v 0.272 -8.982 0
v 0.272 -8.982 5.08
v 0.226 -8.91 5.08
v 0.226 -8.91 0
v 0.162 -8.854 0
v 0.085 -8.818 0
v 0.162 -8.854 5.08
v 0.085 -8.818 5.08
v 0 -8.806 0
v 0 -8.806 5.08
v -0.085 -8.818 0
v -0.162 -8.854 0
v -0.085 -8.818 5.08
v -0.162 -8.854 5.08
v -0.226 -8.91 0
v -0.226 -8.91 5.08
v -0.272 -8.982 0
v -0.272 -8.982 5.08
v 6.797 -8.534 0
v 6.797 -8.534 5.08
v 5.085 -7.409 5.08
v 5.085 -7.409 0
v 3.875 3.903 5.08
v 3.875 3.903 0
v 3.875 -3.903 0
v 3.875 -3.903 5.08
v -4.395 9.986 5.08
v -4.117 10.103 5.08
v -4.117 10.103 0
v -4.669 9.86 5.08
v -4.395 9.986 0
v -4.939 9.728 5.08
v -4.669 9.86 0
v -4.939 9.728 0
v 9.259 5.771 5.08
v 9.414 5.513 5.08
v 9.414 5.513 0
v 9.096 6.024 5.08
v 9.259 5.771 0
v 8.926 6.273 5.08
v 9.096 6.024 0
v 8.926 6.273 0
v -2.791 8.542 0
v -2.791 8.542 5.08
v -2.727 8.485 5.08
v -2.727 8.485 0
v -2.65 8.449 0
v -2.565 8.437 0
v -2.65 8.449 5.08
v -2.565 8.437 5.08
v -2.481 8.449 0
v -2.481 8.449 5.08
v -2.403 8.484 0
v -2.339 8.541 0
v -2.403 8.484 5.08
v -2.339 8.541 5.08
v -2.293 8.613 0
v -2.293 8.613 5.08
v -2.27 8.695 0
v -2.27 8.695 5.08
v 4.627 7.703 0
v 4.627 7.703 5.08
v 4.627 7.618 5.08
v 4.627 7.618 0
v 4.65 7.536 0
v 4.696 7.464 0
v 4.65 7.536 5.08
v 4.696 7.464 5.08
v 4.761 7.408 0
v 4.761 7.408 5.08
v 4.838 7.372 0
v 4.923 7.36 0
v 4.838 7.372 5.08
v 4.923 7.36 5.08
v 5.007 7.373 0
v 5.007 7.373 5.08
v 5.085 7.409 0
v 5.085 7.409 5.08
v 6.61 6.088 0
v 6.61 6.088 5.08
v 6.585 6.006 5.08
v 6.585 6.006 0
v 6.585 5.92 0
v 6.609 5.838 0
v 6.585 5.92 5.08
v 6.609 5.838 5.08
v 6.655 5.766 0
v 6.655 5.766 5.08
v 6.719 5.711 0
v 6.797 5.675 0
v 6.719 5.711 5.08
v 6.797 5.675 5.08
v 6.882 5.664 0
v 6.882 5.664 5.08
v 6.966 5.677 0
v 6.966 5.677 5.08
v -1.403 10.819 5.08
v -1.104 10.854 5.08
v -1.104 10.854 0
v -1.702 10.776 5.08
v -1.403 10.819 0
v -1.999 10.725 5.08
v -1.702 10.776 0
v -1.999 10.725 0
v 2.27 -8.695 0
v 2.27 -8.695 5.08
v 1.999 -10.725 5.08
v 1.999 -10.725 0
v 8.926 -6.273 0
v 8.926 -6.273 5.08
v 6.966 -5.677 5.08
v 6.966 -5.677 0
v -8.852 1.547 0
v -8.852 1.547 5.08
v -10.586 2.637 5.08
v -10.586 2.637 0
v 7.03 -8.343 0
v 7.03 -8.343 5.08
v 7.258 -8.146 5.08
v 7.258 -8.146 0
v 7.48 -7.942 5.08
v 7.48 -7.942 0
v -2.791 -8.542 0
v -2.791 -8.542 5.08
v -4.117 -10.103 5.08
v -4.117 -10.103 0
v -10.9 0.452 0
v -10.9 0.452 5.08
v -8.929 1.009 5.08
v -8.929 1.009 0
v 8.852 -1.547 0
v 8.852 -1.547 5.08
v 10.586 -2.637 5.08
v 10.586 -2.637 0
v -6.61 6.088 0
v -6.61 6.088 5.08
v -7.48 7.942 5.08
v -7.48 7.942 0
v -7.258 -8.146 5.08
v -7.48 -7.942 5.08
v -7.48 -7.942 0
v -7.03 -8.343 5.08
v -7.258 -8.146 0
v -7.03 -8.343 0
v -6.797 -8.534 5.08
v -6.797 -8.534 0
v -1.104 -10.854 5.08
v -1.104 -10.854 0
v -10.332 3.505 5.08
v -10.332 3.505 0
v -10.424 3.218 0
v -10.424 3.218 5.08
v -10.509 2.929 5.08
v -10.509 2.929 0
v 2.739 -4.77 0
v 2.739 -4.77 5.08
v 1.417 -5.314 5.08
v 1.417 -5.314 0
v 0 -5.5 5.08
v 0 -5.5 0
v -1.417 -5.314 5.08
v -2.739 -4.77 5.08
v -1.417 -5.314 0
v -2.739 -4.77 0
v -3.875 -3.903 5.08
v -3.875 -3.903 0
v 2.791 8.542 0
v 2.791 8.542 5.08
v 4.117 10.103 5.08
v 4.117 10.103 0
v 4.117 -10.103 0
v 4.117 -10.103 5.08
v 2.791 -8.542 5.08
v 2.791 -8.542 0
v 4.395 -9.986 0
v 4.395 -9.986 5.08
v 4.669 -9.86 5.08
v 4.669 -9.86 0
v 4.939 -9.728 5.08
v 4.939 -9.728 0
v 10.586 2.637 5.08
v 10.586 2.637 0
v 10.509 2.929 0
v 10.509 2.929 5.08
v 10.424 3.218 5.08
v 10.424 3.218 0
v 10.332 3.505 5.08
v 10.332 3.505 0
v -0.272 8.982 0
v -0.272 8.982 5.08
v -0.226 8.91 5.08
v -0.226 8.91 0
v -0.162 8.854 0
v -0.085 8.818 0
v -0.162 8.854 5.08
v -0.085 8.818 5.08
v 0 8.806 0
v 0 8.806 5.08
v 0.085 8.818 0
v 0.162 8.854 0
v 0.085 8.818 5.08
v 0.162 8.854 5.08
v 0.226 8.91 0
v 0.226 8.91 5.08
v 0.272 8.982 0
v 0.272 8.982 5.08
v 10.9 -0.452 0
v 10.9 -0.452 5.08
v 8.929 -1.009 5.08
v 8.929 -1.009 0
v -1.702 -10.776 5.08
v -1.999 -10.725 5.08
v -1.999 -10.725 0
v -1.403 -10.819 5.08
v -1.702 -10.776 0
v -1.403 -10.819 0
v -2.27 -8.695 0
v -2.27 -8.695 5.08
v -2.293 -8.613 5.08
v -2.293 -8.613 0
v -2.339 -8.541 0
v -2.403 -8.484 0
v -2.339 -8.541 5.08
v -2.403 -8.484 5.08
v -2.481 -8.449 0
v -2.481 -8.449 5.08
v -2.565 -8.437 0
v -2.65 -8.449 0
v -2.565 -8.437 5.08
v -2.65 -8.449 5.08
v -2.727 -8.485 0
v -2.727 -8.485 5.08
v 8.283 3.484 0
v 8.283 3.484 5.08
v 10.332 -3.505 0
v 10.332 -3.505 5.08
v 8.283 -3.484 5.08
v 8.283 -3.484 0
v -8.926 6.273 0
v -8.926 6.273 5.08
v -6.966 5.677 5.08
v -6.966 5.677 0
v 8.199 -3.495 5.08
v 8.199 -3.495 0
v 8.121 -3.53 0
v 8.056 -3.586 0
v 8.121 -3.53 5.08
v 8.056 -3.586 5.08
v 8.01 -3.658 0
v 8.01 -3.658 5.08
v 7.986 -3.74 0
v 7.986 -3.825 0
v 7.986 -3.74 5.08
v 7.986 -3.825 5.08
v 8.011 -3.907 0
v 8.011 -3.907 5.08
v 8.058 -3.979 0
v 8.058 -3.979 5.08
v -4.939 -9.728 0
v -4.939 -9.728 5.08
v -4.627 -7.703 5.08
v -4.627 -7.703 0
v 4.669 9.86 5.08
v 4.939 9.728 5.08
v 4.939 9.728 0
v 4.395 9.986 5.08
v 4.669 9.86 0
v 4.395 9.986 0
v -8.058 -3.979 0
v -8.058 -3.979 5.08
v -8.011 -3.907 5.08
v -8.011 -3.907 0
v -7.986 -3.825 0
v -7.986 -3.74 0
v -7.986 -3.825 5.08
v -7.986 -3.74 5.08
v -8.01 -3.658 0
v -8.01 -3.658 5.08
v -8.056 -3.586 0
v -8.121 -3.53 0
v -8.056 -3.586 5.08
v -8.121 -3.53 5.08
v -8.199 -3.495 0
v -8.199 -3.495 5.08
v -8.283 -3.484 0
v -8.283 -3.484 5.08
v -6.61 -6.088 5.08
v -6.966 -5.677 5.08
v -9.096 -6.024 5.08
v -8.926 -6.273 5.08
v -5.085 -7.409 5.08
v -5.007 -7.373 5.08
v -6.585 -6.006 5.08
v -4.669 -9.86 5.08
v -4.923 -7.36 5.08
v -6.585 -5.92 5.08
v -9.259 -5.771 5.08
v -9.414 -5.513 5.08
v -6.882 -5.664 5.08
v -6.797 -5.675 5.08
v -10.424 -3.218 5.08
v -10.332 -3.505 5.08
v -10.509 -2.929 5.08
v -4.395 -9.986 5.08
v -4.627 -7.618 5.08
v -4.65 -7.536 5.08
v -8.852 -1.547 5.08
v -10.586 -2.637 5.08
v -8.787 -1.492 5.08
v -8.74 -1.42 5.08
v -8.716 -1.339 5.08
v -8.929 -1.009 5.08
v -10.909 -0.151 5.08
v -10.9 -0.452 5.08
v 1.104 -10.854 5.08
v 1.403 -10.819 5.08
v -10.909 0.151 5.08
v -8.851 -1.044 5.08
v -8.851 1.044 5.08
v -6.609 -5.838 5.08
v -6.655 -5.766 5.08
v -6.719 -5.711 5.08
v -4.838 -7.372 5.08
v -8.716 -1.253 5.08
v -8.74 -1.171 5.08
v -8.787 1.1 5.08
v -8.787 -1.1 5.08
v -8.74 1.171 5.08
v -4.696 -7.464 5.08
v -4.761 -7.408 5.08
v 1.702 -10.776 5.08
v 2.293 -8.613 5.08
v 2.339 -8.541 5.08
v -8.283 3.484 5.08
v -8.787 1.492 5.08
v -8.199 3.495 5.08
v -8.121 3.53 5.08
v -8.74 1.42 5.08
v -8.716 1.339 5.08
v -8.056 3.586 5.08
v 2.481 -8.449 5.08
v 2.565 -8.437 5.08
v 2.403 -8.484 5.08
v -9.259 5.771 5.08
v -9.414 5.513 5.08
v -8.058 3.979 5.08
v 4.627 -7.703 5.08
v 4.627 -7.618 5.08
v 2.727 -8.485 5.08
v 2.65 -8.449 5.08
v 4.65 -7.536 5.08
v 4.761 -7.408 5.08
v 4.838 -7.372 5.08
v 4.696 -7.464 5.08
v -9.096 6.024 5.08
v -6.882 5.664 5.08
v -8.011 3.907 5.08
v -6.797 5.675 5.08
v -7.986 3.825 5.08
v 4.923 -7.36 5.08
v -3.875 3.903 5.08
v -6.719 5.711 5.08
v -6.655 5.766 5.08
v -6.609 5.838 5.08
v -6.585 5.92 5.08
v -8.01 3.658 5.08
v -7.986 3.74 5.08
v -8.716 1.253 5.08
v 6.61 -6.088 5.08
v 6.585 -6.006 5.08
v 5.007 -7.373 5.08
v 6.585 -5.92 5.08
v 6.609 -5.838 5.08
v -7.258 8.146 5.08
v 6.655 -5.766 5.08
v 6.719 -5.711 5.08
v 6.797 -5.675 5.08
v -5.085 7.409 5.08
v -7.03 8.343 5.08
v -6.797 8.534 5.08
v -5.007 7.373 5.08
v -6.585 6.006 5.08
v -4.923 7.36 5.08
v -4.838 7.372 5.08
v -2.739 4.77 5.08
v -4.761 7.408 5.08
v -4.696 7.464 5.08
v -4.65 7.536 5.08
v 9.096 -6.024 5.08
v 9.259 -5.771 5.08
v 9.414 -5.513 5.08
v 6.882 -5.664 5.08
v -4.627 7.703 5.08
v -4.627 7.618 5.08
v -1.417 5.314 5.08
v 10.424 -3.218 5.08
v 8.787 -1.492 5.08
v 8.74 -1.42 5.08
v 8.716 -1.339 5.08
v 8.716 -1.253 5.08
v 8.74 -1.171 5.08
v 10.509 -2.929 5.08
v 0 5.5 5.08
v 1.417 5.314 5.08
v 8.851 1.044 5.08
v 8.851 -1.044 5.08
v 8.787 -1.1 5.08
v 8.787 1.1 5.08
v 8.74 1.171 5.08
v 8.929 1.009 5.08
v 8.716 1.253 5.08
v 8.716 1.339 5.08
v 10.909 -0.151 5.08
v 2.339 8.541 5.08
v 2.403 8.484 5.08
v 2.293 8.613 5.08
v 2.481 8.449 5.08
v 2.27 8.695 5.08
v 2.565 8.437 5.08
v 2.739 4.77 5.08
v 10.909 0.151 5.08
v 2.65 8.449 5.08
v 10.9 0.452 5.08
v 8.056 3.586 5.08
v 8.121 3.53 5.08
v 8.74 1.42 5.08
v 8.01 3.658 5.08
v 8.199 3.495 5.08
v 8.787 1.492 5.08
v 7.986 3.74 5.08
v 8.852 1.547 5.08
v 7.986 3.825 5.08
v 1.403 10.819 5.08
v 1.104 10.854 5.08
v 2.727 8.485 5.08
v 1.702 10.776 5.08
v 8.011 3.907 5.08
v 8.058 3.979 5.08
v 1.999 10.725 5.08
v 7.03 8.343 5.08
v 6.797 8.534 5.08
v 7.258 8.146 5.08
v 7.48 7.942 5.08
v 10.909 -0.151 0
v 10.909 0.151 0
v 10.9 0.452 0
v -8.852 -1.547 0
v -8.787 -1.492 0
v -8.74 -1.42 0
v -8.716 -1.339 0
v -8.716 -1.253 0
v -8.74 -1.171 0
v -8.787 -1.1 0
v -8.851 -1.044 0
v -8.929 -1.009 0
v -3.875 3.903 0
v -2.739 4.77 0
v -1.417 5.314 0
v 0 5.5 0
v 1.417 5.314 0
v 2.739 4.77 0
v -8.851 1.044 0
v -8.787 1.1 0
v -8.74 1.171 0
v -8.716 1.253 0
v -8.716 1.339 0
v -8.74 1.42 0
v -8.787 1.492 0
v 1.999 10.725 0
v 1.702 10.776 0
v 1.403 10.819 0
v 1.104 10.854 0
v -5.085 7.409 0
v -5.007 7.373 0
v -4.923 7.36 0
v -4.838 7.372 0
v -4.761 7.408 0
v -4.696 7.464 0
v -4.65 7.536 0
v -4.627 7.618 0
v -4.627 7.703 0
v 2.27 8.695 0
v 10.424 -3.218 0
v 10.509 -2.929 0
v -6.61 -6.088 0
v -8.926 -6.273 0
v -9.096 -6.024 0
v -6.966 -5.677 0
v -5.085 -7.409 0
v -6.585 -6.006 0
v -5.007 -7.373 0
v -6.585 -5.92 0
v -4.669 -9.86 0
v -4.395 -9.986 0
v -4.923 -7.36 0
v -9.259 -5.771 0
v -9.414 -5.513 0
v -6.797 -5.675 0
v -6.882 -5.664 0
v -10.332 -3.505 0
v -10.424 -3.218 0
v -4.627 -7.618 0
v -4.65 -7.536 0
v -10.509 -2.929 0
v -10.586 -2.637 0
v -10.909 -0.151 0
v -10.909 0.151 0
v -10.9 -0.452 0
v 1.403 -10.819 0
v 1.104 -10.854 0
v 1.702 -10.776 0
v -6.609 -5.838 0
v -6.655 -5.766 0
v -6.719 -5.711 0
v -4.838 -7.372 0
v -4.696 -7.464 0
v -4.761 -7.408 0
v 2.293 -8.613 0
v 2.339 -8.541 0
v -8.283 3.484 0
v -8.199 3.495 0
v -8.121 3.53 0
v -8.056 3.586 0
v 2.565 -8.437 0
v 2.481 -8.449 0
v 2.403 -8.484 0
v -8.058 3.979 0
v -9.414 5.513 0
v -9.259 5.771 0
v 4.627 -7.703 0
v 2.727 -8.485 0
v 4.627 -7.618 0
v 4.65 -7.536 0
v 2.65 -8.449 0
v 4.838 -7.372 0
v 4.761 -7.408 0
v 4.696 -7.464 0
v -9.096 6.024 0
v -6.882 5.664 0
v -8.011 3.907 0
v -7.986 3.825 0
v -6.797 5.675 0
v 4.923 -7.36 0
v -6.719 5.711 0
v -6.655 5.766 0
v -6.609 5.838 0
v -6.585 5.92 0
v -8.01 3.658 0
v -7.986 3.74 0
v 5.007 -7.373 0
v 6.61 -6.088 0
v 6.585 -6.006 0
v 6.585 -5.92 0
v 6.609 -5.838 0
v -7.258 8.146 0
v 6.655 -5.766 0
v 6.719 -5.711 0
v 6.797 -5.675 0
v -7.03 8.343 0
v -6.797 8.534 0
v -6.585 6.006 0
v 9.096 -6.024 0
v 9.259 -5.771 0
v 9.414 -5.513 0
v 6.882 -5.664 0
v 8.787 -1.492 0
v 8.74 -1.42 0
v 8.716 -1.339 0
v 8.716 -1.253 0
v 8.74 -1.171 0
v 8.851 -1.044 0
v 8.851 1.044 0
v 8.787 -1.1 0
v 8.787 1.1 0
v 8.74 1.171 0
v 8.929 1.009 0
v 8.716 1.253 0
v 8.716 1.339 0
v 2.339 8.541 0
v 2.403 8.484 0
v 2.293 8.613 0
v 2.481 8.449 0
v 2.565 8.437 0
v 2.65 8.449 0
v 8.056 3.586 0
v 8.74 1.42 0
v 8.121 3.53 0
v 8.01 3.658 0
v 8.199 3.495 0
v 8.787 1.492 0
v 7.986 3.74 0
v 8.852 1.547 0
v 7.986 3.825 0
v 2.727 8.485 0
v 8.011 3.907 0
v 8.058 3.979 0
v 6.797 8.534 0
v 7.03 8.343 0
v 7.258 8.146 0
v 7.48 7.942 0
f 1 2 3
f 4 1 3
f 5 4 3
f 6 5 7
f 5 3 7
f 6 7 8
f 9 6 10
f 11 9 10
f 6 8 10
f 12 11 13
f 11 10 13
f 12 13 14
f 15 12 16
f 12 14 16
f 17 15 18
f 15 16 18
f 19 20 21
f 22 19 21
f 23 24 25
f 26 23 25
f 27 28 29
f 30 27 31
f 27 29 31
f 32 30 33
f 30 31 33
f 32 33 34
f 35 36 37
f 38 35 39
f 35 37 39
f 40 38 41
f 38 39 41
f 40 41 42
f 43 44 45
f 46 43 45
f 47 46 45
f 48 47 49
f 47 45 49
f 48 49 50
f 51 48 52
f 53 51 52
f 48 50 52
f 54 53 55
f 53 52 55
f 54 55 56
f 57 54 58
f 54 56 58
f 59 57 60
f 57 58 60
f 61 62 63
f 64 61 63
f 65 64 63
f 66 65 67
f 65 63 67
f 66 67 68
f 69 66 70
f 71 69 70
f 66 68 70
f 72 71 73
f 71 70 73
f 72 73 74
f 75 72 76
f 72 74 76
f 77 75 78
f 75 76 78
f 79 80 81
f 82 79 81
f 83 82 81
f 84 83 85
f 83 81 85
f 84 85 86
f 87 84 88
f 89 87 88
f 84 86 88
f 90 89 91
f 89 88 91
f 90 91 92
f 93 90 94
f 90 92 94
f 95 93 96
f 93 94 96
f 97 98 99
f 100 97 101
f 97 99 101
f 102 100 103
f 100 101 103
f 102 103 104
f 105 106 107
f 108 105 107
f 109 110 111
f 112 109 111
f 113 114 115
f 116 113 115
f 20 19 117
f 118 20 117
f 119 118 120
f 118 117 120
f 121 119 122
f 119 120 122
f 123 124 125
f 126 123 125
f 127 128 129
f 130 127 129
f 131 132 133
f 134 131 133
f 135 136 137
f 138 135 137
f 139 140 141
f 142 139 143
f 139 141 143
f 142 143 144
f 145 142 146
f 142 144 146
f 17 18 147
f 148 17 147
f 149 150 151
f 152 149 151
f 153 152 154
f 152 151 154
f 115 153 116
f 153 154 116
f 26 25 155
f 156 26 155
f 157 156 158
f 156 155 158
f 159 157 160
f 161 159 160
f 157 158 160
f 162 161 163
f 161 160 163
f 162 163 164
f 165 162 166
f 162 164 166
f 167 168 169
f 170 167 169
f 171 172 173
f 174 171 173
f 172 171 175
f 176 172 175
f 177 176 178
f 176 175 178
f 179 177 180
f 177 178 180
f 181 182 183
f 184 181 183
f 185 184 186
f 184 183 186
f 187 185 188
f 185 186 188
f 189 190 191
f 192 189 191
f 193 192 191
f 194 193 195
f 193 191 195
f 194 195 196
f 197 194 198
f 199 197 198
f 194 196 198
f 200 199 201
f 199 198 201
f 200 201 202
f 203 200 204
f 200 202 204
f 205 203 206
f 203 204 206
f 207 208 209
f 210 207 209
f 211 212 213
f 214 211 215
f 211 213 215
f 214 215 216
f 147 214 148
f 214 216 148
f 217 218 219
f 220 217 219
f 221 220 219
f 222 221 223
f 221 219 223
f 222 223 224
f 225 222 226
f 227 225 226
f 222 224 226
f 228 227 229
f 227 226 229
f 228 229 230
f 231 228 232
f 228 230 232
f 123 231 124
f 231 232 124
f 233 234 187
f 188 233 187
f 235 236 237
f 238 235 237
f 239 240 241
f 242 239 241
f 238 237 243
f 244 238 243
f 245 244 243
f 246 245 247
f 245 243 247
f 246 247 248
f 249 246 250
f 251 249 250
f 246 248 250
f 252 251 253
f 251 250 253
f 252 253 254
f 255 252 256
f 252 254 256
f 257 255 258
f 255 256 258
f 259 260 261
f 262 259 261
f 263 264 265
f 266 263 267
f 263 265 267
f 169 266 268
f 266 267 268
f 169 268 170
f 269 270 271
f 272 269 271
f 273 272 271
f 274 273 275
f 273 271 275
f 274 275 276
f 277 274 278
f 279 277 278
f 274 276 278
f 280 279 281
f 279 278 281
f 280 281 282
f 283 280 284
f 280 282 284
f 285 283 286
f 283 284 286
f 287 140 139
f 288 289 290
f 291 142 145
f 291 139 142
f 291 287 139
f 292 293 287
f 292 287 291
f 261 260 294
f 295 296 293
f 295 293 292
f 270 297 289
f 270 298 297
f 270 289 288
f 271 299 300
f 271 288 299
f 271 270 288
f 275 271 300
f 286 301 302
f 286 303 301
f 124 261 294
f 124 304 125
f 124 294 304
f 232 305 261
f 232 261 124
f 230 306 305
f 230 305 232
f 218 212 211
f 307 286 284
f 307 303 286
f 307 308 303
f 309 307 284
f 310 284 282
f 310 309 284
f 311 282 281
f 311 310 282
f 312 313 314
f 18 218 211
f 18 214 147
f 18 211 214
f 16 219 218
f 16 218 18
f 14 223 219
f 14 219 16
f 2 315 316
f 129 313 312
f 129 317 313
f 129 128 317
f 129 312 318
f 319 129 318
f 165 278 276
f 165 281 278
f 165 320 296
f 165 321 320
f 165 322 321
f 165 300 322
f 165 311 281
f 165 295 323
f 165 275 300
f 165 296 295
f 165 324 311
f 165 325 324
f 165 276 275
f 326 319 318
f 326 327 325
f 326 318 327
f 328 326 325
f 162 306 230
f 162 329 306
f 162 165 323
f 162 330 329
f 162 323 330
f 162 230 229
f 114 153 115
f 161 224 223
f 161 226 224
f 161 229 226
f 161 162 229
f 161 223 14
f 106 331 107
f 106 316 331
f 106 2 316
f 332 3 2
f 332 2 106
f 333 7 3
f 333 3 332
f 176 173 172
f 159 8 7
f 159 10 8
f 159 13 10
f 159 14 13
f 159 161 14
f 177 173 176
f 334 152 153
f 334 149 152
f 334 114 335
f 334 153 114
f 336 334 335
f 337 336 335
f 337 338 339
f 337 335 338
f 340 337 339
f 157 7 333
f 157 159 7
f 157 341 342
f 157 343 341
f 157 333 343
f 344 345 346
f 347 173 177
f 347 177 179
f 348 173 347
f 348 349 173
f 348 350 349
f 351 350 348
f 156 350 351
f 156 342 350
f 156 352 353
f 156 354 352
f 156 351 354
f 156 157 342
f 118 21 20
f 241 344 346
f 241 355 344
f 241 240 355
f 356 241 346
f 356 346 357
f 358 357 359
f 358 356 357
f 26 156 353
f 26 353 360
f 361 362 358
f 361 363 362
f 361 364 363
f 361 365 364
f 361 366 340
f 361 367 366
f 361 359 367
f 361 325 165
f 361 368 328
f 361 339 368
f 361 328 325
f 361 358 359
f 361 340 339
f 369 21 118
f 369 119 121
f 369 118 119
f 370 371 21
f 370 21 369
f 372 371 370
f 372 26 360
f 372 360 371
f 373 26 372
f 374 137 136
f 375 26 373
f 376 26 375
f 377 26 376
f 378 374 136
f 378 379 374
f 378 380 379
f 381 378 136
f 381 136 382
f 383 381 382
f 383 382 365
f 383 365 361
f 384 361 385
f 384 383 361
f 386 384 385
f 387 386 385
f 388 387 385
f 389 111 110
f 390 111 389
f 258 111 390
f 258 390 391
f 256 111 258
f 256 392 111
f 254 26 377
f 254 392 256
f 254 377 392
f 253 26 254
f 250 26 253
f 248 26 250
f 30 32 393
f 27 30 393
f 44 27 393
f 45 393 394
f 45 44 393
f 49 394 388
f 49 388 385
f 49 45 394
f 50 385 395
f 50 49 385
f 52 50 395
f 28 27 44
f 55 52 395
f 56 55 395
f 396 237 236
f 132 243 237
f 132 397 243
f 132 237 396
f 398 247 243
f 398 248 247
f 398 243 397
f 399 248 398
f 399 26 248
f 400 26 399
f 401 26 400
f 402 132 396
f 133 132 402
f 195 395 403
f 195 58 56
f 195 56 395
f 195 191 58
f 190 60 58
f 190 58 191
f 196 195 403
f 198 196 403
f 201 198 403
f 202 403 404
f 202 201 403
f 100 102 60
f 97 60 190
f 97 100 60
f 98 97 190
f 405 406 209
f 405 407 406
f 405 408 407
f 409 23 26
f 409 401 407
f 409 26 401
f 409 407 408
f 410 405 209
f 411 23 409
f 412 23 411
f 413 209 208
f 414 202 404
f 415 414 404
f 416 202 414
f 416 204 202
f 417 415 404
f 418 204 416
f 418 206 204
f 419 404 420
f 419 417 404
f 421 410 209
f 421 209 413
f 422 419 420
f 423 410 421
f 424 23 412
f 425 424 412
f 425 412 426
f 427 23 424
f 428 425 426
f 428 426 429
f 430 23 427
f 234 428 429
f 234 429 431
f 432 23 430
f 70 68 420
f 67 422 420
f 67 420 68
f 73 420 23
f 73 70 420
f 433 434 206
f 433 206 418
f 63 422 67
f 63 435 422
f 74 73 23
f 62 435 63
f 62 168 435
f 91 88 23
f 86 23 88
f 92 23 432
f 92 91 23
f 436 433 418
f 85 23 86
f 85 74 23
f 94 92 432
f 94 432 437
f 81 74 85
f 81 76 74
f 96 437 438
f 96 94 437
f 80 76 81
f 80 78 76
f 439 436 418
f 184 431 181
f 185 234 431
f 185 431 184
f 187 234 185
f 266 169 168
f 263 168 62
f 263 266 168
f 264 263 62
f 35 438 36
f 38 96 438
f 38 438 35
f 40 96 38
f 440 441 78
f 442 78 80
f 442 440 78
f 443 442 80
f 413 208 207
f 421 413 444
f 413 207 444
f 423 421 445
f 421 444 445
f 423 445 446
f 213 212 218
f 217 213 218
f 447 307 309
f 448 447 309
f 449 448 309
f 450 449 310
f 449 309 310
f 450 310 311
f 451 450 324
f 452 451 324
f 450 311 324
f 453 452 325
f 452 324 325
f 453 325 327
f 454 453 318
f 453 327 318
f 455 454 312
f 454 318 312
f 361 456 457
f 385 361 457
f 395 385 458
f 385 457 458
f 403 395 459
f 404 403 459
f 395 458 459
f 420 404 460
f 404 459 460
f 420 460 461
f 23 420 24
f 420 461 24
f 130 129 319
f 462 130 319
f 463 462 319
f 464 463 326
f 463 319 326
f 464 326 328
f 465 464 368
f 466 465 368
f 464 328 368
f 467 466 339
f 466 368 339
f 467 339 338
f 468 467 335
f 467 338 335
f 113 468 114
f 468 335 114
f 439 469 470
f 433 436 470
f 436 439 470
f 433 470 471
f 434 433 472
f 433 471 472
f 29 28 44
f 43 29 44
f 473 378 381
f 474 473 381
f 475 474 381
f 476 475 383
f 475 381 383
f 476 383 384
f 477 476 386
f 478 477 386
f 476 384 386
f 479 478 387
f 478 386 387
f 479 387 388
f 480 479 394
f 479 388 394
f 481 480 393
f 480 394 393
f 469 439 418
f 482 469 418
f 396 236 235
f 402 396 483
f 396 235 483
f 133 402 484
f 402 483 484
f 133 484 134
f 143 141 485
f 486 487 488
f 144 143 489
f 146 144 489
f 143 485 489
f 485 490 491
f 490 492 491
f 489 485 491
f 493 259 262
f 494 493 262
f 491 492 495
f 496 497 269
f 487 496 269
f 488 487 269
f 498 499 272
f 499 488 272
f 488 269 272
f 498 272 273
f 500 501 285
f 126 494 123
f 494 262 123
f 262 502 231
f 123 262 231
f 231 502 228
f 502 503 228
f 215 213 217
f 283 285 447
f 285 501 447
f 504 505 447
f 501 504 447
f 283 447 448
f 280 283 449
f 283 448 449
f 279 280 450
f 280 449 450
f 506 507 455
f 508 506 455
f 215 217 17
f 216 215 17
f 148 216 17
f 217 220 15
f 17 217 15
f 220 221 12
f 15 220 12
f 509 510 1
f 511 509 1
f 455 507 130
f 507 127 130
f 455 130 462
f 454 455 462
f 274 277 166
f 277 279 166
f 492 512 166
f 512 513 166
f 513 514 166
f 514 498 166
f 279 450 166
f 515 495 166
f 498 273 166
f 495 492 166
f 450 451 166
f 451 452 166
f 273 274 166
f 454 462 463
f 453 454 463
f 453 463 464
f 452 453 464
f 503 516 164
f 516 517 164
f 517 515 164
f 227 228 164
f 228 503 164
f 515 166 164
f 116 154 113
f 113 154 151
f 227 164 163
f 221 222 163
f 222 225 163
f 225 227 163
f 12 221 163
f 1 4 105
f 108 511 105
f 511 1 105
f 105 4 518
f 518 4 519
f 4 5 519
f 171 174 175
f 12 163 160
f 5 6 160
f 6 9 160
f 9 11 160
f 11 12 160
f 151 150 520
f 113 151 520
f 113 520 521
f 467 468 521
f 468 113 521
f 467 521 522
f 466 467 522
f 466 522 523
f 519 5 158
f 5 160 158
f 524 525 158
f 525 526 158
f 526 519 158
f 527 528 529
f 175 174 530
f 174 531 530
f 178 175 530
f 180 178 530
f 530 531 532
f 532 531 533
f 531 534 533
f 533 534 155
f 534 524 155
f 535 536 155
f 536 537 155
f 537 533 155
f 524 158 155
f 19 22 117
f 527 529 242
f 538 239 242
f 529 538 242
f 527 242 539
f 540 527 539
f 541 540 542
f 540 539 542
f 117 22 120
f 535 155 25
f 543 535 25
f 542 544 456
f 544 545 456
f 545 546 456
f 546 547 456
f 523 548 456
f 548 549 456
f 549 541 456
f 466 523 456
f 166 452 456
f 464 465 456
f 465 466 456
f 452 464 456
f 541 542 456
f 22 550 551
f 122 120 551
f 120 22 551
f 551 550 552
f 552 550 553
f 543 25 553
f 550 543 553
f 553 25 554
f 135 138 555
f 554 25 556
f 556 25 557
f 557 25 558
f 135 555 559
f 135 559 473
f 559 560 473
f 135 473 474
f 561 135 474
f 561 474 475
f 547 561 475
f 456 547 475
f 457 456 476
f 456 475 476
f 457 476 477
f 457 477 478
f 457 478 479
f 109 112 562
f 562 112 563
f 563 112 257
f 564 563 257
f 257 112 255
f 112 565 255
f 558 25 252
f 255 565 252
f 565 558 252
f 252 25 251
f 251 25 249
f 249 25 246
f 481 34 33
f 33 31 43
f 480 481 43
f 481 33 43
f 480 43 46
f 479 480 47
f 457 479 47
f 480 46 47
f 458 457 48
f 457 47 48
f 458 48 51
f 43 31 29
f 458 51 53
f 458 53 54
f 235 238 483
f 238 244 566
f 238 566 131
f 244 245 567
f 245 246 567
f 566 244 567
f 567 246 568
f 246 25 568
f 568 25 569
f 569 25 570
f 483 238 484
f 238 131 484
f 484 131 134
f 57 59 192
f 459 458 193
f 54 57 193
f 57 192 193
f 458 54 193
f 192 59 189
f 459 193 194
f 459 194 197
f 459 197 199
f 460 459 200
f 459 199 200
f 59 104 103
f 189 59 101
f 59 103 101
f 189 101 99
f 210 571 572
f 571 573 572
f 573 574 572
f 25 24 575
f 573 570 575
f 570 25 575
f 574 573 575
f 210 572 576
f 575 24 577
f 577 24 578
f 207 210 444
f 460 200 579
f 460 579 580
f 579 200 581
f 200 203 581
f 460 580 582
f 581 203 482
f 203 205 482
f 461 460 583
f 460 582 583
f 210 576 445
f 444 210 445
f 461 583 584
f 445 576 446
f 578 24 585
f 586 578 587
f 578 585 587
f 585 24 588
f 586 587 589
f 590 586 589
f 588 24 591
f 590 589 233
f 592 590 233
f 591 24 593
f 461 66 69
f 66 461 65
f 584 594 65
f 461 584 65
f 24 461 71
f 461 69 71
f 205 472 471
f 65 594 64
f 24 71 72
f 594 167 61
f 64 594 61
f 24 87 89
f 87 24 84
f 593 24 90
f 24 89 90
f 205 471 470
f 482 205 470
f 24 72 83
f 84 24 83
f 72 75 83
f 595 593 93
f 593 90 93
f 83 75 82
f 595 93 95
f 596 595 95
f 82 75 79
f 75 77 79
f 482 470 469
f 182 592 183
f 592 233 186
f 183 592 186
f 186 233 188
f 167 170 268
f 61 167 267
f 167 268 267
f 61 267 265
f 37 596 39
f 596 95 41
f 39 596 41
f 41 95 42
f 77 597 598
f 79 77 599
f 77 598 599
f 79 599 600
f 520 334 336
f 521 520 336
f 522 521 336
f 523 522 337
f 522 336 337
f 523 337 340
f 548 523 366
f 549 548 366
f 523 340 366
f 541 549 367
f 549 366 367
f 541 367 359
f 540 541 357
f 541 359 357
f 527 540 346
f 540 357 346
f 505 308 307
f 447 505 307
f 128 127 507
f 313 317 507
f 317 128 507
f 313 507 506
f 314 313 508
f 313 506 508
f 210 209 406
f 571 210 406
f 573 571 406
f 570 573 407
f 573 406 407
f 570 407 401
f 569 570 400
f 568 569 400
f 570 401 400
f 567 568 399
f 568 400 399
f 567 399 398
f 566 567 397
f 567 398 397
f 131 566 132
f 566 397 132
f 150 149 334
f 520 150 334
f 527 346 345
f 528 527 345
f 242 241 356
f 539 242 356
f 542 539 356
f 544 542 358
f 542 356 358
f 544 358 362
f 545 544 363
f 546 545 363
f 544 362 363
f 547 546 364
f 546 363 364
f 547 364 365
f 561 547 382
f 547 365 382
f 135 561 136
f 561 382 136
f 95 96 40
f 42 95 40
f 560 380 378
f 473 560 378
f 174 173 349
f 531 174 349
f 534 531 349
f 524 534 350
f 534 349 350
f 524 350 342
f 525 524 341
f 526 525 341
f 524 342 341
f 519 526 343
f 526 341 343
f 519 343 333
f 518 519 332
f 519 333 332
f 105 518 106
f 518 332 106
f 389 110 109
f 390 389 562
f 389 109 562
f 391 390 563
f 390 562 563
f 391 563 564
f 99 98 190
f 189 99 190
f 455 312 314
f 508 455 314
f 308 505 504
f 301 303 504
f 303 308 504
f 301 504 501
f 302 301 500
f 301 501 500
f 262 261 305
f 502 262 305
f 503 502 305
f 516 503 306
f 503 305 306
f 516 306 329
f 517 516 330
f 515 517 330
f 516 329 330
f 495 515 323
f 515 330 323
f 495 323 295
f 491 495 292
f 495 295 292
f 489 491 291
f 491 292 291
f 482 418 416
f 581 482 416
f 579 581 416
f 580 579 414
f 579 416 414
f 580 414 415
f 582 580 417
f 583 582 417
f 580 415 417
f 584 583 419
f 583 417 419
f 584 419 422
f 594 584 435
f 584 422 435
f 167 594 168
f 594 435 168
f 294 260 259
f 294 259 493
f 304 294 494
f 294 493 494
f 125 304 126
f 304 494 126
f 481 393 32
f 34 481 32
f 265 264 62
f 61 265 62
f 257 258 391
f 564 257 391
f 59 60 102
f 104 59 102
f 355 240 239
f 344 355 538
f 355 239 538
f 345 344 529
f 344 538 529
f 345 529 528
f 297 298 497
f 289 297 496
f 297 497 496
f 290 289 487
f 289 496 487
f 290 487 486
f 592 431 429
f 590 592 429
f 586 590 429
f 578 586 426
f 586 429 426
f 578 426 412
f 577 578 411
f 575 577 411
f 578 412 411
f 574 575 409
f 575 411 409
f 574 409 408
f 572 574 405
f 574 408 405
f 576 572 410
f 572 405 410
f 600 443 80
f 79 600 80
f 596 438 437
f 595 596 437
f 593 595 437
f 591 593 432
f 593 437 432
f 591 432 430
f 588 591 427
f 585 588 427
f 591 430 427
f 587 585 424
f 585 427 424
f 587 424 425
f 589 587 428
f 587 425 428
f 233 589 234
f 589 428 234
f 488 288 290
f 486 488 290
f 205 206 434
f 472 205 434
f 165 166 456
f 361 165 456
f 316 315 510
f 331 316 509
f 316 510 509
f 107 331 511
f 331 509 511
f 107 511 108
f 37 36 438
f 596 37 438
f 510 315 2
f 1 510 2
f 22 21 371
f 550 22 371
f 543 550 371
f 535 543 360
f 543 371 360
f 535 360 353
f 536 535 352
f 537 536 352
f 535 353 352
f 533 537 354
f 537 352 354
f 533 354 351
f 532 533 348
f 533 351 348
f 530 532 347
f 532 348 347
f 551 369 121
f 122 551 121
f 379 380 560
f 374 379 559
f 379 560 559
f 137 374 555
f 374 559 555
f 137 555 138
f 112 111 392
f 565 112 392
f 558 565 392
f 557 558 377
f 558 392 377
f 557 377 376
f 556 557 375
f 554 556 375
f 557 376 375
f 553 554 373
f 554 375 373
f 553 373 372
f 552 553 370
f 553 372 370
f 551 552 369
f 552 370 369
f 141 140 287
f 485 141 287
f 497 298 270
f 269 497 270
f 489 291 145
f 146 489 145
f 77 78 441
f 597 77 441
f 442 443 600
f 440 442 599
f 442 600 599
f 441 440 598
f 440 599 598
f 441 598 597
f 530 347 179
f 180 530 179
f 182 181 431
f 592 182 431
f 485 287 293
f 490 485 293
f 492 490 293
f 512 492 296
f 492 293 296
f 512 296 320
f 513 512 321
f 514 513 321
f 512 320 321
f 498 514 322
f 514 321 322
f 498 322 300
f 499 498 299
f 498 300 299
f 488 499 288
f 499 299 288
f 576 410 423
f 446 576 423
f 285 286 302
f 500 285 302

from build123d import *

# Parameters (mm, degrees)
F0_R            = 10.909800859
F1_DEPTH        = 5.08
F3_DEPTH        = 5.08
F3_COPIES_COUNT = 22


# Not quite as in the source:
# - a pattern or mirror of a feature is missing from the dataset's text; its kind, count and spacing are read off the source's solid


with BuildPart() as f1:
    # F0 (on Top) → F1 (new body)
    with BuildSketch(Plane.XY):
        Circle(F0_R)
        with BuildLine():
            ThreePointArc((3.8749986, -3.9031251389), (0, -5.5), (-3.8749986, -3.9031251389))
            Line((-3.8749986, -3.9031251389), (-3.8749986, 3.9031251389))
            ThreePointArc((-3.8749986, 3.9031251389), (0, 5.5), (3.8749986, 3.9031251389))
            Line((3.8749986, 3.9031251389), (3.8749986, -3.9031251389))
        make_face(mode=Mode.SUBTRACT)
    extrude(amount=F1_DEPTH)

    # F2 (on face) → F3 (cut, through all)
    with BuildSketch(Plane.XY.offset(5.08)):
        with BuildLine():
            Line((0.2718847261, 8.9821943232), (1.1039126824, 10.8538072386))
            ThreePointArc((1.1039126824, 10.8538072386), (0, 10.909800859), (-1.1039126824, 10.8538072386))
            Line((-1.1039126824, 10.8538072386), (-0.2718847261, 8.9821943232))
            ThreePointArc((-0.2718847261, 8.9821943232), (0, 8.8055210085), (0.2718847261, 8.9821943232))
        make_face()
    f3 = extrude(amount=-F3_DEPTH, mode=Mode.SUBTRACT)

    # F3_copies: F3 ×22 about axis
    f3_copies_axis = Axis((0, 0, 0), (0, 0, 1))
    for i in range(1, F3_COPIES_COUNT):
        add(f3.rotate(f3_copies_axis, i * 360 / F3_COPIES_COUNT), mode=Mode.SUBTRACT)


solid = f1.part
